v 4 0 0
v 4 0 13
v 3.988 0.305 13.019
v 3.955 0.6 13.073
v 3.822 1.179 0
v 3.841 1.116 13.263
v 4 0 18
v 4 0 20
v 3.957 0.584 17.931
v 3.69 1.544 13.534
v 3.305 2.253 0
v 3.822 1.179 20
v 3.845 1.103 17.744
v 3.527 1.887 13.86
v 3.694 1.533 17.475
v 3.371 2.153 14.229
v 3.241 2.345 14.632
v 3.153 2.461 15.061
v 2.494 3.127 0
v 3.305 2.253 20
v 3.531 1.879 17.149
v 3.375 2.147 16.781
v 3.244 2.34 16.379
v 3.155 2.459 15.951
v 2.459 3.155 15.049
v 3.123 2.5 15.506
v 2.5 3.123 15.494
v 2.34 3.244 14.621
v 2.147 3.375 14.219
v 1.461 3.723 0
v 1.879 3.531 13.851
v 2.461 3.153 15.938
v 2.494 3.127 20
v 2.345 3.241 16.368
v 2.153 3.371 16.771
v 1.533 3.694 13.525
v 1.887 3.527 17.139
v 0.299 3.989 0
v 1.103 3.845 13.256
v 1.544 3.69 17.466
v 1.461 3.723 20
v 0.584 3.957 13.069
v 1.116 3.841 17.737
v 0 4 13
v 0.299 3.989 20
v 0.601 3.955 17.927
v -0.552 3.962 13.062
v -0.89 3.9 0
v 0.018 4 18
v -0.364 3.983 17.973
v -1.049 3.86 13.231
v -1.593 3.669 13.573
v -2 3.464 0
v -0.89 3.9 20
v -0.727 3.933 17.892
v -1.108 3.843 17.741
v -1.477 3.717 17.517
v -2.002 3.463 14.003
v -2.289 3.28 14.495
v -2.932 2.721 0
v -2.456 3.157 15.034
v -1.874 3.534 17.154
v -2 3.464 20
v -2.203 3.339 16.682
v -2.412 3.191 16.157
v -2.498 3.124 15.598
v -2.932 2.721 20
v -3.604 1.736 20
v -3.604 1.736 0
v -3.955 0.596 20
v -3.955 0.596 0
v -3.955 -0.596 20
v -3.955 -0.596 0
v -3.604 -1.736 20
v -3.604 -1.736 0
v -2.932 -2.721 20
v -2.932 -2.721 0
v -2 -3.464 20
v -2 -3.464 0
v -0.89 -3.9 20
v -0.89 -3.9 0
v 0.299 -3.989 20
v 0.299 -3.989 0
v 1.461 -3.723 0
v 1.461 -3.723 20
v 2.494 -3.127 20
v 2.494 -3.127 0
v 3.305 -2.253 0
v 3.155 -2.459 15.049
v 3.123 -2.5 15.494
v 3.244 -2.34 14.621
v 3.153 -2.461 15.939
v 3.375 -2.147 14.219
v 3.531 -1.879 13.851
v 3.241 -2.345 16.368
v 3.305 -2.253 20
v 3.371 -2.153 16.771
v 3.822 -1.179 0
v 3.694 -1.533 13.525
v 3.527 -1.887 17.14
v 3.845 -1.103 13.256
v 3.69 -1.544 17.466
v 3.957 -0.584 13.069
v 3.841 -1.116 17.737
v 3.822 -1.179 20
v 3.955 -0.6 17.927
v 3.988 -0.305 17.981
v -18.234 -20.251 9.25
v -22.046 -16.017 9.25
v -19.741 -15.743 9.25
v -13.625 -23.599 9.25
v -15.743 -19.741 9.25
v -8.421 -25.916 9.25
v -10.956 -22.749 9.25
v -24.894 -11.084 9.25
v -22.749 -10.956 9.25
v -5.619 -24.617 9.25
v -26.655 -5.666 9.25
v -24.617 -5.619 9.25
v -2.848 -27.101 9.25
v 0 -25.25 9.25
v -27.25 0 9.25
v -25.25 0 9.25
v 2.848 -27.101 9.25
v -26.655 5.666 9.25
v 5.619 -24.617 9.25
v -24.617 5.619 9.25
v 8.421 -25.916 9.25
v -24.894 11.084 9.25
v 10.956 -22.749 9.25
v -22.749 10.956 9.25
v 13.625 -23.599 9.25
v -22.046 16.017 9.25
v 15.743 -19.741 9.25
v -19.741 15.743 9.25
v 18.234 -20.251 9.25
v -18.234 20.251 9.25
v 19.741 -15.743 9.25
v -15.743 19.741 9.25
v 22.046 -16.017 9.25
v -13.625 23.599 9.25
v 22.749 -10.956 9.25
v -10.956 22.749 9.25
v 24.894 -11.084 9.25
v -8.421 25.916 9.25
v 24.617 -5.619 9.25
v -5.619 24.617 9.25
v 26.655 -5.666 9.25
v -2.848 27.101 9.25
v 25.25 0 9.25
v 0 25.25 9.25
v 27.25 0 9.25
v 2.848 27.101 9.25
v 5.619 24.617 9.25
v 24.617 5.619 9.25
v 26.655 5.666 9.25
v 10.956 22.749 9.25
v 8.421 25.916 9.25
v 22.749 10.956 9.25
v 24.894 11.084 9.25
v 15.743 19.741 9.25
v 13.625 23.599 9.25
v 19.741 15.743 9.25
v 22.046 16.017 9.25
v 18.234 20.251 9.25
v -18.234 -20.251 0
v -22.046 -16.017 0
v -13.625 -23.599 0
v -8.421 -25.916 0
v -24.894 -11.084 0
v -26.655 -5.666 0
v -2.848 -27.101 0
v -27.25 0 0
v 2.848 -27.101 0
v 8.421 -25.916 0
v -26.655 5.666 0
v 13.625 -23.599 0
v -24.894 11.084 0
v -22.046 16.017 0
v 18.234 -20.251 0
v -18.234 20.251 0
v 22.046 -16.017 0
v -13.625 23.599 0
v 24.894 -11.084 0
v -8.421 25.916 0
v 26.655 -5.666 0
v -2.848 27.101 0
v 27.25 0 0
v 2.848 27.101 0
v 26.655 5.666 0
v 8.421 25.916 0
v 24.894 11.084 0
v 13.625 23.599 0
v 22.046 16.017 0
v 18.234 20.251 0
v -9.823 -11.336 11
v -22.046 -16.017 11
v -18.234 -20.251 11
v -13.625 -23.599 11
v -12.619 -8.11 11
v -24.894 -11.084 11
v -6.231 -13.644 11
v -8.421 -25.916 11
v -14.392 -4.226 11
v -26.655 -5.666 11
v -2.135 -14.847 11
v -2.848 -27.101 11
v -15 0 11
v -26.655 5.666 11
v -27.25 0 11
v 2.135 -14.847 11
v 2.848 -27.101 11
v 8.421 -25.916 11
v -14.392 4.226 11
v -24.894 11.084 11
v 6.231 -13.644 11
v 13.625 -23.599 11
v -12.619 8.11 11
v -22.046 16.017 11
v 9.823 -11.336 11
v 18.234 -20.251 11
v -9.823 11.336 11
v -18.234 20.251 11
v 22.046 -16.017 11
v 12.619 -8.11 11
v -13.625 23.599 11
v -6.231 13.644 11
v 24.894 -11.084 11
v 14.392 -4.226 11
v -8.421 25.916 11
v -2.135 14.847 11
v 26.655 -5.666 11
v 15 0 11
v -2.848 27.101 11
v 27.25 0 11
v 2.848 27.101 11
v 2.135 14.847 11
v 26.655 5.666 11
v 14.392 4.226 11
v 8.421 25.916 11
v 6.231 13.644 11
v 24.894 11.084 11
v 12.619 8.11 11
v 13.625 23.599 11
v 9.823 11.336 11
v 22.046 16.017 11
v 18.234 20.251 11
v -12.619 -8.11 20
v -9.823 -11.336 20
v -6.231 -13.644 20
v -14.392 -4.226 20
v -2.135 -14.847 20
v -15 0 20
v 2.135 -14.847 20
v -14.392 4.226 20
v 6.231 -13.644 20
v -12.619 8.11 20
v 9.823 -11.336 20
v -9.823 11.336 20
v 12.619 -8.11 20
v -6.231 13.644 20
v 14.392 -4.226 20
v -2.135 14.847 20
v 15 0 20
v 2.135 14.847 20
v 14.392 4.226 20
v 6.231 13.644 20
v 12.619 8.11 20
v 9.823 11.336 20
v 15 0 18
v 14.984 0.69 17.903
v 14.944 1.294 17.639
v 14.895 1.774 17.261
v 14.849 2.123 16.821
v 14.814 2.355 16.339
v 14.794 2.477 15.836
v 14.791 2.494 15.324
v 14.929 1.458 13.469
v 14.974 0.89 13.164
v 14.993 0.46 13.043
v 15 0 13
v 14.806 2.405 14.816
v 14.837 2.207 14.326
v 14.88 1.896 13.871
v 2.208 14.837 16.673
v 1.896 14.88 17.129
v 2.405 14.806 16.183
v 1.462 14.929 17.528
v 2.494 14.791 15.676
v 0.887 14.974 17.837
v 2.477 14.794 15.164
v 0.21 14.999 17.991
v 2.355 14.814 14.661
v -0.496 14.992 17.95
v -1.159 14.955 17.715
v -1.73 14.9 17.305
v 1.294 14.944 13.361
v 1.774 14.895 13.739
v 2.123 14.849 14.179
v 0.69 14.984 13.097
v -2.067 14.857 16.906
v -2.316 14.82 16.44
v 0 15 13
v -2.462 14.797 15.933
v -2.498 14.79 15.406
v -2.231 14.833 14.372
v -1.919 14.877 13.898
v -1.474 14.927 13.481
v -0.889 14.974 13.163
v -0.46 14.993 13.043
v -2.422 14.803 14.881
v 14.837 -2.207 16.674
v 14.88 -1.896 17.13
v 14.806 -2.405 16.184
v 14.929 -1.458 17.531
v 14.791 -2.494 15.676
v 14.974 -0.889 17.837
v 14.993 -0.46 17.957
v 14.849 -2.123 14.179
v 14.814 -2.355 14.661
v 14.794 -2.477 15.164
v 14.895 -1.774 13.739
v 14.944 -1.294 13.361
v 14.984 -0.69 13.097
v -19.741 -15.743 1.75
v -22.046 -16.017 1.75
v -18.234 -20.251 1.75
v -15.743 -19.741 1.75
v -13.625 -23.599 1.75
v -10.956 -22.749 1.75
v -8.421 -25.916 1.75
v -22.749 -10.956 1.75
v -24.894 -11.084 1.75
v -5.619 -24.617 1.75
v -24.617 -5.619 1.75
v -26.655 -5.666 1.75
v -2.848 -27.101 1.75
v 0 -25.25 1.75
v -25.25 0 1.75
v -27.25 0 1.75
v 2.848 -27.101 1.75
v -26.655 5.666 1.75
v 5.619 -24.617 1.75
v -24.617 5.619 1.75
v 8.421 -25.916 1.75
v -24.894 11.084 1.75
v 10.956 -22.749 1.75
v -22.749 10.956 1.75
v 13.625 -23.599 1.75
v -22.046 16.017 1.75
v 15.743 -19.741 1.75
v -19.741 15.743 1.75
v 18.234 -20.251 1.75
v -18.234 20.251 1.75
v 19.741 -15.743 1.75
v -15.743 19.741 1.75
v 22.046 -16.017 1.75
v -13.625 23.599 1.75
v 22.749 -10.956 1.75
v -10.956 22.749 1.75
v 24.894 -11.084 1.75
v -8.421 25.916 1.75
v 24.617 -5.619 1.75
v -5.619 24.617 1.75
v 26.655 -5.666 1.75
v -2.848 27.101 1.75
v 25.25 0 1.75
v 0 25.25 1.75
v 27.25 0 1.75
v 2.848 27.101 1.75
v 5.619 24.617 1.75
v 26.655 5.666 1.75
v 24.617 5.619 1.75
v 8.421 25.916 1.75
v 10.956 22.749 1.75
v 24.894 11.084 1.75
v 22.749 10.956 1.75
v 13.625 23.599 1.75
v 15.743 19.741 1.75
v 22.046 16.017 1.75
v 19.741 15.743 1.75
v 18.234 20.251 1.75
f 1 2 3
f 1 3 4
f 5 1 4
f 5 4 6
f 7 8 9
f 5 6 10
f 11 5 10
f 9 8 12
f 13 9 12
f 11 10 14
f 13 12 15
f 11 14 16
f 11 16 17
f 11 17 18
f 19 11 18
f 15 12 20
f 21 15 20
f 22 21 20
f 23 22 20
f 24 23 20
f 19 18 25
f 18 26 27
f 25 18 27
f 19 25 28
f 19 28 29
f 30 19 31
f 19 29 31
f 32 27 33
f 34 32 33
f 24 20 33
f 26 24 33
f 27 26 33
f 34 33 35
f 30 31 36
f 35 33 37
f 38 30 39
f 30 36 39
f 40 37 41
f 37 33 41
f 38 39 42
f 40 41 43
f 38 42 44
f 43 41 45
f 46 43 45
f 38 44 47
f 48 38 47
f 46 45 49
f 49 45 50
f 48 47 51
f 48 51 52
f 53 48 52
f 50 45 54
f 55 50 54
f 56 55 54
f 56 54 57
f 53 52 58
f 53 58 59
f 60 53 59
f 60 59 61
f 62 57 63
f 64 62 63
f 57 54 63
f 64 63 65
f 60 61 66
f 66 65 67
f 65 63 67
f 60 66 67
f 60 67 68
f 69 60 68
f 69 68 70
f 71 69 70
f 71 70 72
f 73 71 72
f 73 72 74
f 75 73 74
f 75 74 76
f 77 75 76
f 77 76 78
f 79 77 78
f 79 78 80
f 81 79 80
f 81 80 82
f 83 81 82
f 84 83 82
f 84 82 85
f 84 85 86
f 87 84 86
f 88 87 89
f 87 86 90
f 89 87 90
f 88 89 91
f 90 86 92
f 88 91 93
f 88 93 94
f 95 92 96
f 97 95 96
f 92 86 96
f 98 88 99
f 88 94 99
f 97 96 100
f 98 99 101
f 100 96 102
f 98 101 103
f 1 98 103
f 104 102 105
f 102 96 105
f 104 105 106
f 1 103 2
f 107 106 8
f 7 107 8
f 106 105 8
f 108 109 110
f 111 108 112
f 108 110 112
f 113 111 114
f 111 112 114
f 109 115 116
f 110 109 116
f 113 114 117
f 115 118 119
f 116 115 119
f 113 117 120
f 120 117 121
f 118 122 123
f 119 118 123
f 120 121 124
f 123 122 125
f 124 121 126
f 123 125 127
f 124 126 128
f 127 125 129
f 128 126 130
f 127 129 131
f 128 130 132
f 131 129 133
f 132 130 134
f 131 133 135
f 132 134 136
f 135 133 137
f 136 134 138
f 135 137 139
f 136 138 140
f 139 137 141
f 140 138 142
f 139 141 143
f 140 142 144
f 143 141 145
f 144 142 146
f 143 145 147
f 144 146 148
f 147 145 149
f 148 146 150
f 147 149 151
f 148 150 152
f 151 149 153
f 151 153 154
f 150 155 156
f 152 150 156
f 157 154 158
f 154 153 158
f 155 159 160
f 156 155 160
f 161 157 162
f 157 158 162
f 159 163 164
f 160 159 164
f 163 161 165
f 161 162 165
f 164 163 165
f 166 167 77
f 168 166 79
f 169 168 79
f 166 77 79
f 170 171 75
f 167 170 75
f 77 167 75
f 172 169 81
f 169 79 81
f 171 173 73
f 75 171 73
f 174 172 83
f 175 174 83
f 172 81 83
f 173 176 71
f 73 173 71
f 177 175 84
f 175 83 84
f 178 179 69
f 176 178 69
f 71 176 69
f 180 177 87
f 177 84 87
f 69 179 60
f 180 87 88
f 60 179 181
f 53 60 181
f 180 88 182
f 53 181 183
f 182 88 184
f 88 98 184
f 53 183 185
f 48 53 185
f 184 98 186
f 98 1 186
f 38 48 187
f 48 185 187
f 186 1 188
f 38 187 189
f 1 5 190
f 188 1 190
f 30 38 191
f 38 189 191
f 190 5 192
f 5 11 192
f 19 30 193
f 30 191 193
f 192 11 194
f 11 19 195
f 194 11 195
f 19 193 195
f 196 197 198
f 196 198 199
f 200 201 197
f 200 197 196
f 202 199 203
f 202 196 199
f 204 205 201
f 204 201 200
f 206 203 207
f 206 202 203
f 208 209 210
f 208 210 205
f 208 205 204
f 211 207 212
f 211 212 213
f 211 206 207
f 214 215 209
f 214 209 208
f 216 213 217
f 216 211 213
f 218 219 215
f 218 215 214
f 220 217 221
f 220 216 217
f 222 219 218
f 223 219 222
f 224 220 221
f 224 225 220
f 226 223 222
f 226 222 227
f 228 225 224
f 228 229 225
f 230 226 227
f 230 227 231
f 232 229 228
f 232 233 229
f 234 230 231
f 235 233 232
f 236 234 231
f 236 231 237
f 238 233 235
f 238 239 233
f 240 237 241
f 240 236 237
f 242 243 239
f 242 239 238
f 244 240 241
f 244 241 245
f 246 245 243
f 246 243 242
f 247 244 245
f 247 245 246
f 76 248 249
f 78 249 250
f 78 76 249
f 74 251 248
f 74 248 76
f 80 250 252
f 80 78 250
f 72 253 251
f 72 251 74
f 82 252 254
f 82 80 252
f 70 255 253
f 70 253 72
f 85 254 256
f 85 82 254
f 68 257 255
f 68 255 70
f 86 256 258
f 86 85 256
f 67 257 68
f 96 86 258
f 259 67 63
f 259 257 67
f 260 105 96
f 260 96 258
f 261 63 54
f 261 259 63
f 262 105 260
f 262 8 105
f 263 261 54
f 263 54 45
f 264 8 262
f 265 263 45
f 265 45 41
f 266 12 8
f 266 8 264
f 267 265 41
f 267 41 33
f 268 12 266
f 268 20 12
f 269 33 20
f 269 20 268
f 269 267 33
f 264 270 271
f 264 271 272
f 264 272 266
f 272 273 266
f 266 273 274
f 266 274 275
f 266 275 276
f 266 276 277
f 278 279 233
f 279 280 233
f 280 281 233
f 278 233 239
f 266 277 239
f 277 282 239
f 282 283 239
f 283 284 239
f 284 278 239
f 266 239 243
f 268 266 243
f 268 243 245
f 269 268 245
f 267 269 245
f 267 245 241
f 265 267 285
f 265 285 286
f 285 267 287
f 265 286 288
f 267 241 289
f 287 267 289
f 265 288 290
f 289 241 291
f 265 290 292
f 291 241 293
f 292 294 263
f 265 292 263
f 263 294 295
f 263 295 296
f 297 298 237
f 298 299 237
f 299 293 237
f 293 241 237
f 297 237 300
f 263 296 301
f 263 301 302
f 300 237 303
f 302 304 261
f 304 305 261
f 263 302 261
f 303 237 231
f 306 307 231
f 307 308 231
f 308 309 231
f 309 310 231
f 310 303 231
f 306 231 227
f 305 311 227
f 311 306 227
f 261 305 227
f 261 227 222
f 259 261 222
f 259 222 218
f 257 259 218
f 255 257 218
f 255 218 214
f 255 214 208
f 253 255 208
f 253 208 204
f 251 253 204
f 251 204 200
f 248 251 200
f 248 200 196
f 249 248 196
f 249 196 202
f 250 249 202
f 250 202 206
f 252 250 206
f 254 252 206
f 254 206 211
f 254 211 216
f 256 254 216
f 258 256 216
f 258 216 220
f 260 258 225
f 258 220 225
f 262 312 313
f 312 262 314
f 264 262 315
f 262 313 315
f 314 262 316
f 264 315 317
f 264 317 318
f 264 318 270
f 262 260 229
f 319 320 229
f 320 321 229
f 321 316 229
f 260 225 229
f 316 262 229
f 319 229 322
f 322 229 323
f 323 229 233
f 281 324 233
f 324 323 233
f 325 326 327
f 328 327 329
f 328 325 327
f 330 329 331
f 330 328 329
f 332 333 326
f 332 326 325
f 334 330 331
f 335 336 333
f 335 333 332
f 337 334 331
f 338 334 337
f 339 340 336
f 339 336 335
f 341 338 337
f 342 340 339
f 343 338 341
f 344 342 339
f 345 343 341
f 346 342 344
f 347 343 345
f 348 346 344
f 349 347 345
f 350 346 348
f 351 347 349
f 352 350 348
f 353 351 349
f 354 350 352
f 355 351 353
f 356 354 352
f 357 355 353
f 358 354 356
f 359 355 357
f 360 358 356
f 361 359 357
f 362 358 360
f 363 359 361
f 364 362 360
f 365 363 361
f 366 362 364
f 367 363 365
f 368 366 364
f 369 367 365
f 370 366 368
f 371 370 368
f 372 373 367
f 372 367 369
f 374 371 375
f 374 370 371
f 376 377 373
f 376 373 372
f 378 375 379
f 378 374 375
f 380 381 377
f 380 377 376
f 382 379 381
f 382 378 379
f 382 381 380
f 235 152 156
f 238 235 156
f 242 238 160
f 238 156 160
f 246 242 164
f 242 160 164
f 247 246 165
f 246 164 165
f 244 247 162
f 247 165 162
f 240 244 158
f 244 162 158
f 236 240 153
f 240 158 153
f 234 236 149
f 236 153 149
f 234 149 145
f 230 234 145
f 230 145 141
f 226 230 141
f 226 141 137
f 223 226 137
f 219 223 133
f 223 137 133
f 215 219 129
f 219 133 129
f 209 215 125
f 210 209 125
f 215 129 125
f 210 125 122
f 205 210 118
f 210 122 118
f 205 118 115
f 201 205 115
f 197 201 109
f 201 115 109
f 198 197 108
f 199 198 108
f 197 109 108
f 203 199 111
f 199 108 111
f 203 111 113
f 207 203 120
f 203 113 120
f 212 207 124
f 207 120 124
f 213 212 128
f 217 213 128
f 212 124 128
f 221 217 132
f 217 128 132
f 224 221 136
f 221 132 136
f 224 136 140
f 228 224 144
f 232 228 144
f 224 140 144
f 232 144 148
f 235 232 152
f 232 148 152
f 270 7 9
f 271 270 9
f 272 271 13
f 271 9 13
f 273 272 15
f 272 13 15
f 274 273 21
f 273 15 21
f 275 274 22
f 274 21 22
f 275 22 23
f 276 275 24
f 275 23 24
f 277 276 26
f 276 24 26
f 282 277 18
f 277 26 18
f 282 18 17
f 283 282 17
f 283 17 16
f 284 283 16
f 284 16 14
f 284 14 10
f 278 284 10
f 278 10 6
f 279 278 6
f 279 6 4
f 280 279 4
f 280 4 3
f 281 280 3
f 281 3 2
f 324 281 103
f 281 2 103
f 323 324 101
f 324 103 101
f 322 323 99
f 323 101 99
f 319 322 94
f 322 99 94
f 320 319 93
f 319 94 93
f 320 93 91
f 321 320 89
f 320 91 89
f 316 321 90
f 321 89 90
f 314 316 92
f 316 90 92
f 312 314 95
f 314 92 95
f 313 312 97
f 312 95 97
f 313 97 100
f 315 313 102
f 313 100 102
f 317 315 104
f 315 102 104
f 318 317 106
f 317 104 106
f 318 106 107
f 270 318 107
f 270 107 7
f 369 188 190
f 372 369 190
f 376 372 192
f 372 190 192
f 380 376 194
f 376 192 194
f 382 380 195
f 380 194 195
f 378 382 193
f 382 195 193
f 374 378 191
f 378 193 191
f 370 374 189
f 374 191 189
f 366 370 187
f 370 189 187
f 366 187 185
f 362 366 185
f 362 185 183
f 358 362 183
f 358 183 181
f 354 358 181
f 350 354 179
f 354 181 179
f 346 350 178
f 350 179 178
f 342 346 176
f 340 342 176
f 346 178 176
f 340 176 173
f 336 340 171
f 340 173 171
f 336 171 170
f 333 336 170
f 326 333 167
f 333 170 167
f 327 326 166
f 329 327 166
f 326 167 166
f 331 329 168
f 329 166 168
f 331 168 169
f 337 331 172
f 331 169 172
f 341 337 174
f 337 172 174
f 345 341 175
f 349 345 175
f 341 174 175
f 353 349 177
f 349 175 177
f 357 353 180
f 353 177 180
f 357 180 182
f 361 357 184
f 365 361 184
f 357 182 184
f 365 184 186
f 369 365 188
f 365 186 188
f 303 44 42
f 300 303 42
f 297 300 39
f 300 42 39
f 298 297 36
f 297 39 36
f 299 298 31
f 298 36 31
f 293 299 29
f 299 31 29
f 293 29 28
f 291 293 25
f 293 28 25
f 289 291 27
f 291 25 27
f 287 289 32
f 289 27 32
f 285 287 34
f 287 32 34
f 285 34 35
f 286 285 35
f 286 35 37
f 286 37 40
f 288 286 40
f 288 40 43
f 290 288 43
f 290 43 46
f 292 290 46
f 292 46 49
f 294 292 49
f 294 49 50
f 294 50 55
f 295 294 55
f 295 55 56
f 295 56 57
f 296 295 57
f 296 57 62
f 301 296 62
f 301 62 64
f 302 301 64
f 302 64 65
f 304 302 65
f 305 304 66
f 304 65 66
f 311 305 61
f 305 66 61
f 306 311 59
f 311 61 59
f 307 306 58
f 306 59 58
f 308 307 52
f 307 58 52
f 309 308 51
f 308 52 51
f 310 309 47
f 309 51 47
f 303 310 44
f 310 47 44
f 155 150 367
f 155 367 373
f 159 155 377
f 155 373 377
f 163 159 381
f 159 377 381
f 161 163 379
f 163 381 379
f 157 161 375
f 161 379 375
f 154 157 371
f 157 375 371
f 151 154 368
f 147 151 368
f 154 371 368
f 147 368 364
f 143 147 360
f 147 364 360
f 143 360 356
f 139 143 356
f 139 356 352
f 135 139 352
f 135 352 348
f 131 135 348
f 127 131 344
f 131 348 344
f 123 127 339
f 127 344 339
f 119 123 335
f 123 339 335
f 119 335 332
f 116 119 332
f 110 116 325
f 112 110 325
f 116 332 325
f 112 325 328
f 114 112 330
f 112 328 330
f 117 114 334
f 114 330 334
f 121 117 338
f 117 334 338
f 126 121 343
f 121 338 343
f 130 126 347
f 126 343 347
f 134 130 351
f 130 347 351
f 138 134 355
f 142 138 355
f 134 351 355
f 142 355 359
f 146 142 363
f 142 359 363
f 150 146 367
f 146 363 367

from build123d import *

# Parameters (mm, degrees)
SKETCH1_R               = 27.25
BOSS_EXTRUDE1_DEPTH     = 1.75
SKETCH2_R               = 25.25
BOSS_EXTRUDE2_DEPTH     = 7.5
SKETCH3_R               = 27.25
BOSS_EXTRUDE3_DEPTH     = 1.75
SKETCH4_R               = 15
BOSS_EXTRUDE4_DEPTH     = 9
SKETCH6_R               = 4
CUT_EXTRUDE1_DEPTH      = 20
CUT_EXTRUDE2_REACH      = 45.418
CUT_EXTRUDE2_END_RADIUS = 15
SKETCH7_R               = 2.5
CUT_EXTRUDE3_REACH      = 45.418
CUT_EXTRUDE3_END_RADIUS = 15
SKETCH8_R               = 2.5


with BuildPart() as part:
    # Sketch1 → Boss-Extrude1 (new body)
    with BuildSketch(Plane.XY):
        Circle(SKETCH1_R)
    extrude(amount=BOSS_EXTRUDE1_DEPTH)

    # Sketch2 → Boss-Extrude2 (add)
    with BuildSketch(Plane.XY.offset(1.75)):
        Circle(SKETCH2_R)
    extrude(amount=BOSS_EXTRUDE2_DEPTH)

    # Sketch3 → Boss-Extrude3 (add)
    with BuildSketch(Plane.XY.offset(9.25)):
        Circle(SKETCH3_R)
    extrude(amount=BOSS_EXTRUDE3_DEPTH)

    # Sketch4 → Boss-Extrude4 (add)
    with BuildSketch(Plane.XY.offset(11)):
        Circle(SKETCH4_R)
    extrude(amount=BOSS_EXTRUDE4_DEPTH)

    # Sketch6 → Cut-Extrude1 (cut)
    with BuildSketch(Plane.XY.offset(20)):
        Circle(SKETCH6_R)
    extrude(amount=-CUT_EXTRUDE1_DEPTH, mode=Mode.SUBTRACT)

    # Cut-Extrude2: up to this cylinder (the profile starts inside it)
    cut_extrude2_end = Plane(origin=(0, 0, 15.5), z_dir=(0, 0, -1)) * Cylinder(CUT_EXTRUDE2_END_RADIUS, 121.836, mode=Mode.PRIVATE)
    # Sketch7 → Cut-Extrude2 (cut, up to the surface)
    with BuildSketch(Plane.ZY, mode=Mode.PRIVATE) as cut_extrude2_sk1:
        with Locations((15.5, 0)):
            Circle(SKETCH7_R)
    cut_extrude2_tool1 = extrude(cut_extrude2_sk1.sketch, amount=-CUT_EXTRUDE2_REACH, mode=Mode.PRIVATE) & cut_extrude2_end
    add(cut_extrude2_tool1.solids().sort_by_distance((0, 0, 15.5))[0], mode=Mode.SUBTRACT)

    # Cut-Extrude3: up to this cylinder (the profile starts inside it)
    cut_extrude3_end = Plane(origin=(0, 0, 15.5), z_dir=(0, 0, -1)) * Cylinder(CUT_EXTRUDE3_END_RADIUS, 121.836, mode=Mode.PRIVATE)
    # Sketch8 → Cut-Extrude3 (cut, up to the surface)
    with BuildSketch(Plane(origin=(0, 0, 0), x_dir=(0, 0, 1), z_dir=(0, -1, 0)), mode=Mode.PRIVATE) as cut_extrude3_sk1:
        with Locations(Location((15.5, 0, 0), (0, 0, 180))):
            Circle(SKETCH8_R)
    cut_extrude3_tool1 = extrude(cut_extrude3_sk1.sketch, amount=-CUT_EXTRUDE3_REACH, mode=Mode.PRIVATE) & cut_extrude3_end
    add(cut_extrude3_tool1.solids().sort_by_distance((0, 0, 15.5))[0], mode=Mode.SUBTRACT)


solid = part.part
